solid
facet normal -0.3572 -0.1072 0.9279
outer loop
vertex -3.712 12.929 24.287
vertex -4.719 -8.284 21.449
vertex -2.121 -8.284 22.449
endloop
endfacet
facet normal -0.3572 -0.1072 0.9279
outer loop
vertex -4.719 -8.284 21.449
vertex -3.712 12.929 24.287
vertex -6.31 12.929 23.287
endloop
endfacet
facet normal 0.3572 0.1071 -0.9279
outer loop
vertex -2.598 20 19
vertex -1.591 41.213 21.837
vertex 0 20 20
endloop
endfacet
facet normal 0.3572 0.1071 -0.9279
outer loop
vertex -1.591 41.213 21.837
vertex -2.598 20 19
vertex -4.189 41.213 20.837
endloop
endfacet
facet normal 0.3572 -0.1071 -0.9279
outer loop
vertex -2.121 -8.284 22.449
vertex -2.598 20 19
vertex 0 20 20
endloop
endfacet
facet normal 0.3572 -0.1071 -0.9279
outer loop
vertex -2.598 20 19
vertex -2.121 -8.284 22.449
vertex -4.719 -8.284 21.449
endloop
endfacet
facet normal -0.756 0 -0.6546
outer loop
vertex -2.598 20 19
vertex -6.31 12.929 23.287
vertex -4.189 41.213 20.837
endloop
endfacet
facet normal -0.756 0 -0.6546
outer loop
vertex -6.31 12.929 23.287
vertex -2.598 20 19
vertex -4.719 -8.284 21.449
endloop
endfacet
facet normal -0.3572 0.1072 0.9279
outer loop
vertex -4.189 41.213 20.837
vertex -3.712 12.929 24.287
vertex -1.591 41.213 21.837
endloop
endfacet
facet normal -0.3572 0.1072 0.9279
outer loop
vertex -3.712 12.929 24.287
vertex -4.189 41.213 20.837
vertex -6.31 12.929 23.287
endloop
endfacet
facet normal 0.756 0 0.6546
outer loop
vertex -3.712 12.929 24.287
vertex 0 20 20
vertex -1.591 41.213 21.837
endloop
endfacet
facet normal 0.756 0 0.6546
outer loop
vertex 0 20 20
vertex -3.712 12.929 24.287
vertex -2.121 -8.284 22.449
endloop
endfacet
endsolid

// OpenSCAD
translate([0, 20, 20])
  scale([1.5, 10, 1])
  rotate([45, -30, 0])
  mirror([1, 0, 0])
  cube([2,3,4]);
